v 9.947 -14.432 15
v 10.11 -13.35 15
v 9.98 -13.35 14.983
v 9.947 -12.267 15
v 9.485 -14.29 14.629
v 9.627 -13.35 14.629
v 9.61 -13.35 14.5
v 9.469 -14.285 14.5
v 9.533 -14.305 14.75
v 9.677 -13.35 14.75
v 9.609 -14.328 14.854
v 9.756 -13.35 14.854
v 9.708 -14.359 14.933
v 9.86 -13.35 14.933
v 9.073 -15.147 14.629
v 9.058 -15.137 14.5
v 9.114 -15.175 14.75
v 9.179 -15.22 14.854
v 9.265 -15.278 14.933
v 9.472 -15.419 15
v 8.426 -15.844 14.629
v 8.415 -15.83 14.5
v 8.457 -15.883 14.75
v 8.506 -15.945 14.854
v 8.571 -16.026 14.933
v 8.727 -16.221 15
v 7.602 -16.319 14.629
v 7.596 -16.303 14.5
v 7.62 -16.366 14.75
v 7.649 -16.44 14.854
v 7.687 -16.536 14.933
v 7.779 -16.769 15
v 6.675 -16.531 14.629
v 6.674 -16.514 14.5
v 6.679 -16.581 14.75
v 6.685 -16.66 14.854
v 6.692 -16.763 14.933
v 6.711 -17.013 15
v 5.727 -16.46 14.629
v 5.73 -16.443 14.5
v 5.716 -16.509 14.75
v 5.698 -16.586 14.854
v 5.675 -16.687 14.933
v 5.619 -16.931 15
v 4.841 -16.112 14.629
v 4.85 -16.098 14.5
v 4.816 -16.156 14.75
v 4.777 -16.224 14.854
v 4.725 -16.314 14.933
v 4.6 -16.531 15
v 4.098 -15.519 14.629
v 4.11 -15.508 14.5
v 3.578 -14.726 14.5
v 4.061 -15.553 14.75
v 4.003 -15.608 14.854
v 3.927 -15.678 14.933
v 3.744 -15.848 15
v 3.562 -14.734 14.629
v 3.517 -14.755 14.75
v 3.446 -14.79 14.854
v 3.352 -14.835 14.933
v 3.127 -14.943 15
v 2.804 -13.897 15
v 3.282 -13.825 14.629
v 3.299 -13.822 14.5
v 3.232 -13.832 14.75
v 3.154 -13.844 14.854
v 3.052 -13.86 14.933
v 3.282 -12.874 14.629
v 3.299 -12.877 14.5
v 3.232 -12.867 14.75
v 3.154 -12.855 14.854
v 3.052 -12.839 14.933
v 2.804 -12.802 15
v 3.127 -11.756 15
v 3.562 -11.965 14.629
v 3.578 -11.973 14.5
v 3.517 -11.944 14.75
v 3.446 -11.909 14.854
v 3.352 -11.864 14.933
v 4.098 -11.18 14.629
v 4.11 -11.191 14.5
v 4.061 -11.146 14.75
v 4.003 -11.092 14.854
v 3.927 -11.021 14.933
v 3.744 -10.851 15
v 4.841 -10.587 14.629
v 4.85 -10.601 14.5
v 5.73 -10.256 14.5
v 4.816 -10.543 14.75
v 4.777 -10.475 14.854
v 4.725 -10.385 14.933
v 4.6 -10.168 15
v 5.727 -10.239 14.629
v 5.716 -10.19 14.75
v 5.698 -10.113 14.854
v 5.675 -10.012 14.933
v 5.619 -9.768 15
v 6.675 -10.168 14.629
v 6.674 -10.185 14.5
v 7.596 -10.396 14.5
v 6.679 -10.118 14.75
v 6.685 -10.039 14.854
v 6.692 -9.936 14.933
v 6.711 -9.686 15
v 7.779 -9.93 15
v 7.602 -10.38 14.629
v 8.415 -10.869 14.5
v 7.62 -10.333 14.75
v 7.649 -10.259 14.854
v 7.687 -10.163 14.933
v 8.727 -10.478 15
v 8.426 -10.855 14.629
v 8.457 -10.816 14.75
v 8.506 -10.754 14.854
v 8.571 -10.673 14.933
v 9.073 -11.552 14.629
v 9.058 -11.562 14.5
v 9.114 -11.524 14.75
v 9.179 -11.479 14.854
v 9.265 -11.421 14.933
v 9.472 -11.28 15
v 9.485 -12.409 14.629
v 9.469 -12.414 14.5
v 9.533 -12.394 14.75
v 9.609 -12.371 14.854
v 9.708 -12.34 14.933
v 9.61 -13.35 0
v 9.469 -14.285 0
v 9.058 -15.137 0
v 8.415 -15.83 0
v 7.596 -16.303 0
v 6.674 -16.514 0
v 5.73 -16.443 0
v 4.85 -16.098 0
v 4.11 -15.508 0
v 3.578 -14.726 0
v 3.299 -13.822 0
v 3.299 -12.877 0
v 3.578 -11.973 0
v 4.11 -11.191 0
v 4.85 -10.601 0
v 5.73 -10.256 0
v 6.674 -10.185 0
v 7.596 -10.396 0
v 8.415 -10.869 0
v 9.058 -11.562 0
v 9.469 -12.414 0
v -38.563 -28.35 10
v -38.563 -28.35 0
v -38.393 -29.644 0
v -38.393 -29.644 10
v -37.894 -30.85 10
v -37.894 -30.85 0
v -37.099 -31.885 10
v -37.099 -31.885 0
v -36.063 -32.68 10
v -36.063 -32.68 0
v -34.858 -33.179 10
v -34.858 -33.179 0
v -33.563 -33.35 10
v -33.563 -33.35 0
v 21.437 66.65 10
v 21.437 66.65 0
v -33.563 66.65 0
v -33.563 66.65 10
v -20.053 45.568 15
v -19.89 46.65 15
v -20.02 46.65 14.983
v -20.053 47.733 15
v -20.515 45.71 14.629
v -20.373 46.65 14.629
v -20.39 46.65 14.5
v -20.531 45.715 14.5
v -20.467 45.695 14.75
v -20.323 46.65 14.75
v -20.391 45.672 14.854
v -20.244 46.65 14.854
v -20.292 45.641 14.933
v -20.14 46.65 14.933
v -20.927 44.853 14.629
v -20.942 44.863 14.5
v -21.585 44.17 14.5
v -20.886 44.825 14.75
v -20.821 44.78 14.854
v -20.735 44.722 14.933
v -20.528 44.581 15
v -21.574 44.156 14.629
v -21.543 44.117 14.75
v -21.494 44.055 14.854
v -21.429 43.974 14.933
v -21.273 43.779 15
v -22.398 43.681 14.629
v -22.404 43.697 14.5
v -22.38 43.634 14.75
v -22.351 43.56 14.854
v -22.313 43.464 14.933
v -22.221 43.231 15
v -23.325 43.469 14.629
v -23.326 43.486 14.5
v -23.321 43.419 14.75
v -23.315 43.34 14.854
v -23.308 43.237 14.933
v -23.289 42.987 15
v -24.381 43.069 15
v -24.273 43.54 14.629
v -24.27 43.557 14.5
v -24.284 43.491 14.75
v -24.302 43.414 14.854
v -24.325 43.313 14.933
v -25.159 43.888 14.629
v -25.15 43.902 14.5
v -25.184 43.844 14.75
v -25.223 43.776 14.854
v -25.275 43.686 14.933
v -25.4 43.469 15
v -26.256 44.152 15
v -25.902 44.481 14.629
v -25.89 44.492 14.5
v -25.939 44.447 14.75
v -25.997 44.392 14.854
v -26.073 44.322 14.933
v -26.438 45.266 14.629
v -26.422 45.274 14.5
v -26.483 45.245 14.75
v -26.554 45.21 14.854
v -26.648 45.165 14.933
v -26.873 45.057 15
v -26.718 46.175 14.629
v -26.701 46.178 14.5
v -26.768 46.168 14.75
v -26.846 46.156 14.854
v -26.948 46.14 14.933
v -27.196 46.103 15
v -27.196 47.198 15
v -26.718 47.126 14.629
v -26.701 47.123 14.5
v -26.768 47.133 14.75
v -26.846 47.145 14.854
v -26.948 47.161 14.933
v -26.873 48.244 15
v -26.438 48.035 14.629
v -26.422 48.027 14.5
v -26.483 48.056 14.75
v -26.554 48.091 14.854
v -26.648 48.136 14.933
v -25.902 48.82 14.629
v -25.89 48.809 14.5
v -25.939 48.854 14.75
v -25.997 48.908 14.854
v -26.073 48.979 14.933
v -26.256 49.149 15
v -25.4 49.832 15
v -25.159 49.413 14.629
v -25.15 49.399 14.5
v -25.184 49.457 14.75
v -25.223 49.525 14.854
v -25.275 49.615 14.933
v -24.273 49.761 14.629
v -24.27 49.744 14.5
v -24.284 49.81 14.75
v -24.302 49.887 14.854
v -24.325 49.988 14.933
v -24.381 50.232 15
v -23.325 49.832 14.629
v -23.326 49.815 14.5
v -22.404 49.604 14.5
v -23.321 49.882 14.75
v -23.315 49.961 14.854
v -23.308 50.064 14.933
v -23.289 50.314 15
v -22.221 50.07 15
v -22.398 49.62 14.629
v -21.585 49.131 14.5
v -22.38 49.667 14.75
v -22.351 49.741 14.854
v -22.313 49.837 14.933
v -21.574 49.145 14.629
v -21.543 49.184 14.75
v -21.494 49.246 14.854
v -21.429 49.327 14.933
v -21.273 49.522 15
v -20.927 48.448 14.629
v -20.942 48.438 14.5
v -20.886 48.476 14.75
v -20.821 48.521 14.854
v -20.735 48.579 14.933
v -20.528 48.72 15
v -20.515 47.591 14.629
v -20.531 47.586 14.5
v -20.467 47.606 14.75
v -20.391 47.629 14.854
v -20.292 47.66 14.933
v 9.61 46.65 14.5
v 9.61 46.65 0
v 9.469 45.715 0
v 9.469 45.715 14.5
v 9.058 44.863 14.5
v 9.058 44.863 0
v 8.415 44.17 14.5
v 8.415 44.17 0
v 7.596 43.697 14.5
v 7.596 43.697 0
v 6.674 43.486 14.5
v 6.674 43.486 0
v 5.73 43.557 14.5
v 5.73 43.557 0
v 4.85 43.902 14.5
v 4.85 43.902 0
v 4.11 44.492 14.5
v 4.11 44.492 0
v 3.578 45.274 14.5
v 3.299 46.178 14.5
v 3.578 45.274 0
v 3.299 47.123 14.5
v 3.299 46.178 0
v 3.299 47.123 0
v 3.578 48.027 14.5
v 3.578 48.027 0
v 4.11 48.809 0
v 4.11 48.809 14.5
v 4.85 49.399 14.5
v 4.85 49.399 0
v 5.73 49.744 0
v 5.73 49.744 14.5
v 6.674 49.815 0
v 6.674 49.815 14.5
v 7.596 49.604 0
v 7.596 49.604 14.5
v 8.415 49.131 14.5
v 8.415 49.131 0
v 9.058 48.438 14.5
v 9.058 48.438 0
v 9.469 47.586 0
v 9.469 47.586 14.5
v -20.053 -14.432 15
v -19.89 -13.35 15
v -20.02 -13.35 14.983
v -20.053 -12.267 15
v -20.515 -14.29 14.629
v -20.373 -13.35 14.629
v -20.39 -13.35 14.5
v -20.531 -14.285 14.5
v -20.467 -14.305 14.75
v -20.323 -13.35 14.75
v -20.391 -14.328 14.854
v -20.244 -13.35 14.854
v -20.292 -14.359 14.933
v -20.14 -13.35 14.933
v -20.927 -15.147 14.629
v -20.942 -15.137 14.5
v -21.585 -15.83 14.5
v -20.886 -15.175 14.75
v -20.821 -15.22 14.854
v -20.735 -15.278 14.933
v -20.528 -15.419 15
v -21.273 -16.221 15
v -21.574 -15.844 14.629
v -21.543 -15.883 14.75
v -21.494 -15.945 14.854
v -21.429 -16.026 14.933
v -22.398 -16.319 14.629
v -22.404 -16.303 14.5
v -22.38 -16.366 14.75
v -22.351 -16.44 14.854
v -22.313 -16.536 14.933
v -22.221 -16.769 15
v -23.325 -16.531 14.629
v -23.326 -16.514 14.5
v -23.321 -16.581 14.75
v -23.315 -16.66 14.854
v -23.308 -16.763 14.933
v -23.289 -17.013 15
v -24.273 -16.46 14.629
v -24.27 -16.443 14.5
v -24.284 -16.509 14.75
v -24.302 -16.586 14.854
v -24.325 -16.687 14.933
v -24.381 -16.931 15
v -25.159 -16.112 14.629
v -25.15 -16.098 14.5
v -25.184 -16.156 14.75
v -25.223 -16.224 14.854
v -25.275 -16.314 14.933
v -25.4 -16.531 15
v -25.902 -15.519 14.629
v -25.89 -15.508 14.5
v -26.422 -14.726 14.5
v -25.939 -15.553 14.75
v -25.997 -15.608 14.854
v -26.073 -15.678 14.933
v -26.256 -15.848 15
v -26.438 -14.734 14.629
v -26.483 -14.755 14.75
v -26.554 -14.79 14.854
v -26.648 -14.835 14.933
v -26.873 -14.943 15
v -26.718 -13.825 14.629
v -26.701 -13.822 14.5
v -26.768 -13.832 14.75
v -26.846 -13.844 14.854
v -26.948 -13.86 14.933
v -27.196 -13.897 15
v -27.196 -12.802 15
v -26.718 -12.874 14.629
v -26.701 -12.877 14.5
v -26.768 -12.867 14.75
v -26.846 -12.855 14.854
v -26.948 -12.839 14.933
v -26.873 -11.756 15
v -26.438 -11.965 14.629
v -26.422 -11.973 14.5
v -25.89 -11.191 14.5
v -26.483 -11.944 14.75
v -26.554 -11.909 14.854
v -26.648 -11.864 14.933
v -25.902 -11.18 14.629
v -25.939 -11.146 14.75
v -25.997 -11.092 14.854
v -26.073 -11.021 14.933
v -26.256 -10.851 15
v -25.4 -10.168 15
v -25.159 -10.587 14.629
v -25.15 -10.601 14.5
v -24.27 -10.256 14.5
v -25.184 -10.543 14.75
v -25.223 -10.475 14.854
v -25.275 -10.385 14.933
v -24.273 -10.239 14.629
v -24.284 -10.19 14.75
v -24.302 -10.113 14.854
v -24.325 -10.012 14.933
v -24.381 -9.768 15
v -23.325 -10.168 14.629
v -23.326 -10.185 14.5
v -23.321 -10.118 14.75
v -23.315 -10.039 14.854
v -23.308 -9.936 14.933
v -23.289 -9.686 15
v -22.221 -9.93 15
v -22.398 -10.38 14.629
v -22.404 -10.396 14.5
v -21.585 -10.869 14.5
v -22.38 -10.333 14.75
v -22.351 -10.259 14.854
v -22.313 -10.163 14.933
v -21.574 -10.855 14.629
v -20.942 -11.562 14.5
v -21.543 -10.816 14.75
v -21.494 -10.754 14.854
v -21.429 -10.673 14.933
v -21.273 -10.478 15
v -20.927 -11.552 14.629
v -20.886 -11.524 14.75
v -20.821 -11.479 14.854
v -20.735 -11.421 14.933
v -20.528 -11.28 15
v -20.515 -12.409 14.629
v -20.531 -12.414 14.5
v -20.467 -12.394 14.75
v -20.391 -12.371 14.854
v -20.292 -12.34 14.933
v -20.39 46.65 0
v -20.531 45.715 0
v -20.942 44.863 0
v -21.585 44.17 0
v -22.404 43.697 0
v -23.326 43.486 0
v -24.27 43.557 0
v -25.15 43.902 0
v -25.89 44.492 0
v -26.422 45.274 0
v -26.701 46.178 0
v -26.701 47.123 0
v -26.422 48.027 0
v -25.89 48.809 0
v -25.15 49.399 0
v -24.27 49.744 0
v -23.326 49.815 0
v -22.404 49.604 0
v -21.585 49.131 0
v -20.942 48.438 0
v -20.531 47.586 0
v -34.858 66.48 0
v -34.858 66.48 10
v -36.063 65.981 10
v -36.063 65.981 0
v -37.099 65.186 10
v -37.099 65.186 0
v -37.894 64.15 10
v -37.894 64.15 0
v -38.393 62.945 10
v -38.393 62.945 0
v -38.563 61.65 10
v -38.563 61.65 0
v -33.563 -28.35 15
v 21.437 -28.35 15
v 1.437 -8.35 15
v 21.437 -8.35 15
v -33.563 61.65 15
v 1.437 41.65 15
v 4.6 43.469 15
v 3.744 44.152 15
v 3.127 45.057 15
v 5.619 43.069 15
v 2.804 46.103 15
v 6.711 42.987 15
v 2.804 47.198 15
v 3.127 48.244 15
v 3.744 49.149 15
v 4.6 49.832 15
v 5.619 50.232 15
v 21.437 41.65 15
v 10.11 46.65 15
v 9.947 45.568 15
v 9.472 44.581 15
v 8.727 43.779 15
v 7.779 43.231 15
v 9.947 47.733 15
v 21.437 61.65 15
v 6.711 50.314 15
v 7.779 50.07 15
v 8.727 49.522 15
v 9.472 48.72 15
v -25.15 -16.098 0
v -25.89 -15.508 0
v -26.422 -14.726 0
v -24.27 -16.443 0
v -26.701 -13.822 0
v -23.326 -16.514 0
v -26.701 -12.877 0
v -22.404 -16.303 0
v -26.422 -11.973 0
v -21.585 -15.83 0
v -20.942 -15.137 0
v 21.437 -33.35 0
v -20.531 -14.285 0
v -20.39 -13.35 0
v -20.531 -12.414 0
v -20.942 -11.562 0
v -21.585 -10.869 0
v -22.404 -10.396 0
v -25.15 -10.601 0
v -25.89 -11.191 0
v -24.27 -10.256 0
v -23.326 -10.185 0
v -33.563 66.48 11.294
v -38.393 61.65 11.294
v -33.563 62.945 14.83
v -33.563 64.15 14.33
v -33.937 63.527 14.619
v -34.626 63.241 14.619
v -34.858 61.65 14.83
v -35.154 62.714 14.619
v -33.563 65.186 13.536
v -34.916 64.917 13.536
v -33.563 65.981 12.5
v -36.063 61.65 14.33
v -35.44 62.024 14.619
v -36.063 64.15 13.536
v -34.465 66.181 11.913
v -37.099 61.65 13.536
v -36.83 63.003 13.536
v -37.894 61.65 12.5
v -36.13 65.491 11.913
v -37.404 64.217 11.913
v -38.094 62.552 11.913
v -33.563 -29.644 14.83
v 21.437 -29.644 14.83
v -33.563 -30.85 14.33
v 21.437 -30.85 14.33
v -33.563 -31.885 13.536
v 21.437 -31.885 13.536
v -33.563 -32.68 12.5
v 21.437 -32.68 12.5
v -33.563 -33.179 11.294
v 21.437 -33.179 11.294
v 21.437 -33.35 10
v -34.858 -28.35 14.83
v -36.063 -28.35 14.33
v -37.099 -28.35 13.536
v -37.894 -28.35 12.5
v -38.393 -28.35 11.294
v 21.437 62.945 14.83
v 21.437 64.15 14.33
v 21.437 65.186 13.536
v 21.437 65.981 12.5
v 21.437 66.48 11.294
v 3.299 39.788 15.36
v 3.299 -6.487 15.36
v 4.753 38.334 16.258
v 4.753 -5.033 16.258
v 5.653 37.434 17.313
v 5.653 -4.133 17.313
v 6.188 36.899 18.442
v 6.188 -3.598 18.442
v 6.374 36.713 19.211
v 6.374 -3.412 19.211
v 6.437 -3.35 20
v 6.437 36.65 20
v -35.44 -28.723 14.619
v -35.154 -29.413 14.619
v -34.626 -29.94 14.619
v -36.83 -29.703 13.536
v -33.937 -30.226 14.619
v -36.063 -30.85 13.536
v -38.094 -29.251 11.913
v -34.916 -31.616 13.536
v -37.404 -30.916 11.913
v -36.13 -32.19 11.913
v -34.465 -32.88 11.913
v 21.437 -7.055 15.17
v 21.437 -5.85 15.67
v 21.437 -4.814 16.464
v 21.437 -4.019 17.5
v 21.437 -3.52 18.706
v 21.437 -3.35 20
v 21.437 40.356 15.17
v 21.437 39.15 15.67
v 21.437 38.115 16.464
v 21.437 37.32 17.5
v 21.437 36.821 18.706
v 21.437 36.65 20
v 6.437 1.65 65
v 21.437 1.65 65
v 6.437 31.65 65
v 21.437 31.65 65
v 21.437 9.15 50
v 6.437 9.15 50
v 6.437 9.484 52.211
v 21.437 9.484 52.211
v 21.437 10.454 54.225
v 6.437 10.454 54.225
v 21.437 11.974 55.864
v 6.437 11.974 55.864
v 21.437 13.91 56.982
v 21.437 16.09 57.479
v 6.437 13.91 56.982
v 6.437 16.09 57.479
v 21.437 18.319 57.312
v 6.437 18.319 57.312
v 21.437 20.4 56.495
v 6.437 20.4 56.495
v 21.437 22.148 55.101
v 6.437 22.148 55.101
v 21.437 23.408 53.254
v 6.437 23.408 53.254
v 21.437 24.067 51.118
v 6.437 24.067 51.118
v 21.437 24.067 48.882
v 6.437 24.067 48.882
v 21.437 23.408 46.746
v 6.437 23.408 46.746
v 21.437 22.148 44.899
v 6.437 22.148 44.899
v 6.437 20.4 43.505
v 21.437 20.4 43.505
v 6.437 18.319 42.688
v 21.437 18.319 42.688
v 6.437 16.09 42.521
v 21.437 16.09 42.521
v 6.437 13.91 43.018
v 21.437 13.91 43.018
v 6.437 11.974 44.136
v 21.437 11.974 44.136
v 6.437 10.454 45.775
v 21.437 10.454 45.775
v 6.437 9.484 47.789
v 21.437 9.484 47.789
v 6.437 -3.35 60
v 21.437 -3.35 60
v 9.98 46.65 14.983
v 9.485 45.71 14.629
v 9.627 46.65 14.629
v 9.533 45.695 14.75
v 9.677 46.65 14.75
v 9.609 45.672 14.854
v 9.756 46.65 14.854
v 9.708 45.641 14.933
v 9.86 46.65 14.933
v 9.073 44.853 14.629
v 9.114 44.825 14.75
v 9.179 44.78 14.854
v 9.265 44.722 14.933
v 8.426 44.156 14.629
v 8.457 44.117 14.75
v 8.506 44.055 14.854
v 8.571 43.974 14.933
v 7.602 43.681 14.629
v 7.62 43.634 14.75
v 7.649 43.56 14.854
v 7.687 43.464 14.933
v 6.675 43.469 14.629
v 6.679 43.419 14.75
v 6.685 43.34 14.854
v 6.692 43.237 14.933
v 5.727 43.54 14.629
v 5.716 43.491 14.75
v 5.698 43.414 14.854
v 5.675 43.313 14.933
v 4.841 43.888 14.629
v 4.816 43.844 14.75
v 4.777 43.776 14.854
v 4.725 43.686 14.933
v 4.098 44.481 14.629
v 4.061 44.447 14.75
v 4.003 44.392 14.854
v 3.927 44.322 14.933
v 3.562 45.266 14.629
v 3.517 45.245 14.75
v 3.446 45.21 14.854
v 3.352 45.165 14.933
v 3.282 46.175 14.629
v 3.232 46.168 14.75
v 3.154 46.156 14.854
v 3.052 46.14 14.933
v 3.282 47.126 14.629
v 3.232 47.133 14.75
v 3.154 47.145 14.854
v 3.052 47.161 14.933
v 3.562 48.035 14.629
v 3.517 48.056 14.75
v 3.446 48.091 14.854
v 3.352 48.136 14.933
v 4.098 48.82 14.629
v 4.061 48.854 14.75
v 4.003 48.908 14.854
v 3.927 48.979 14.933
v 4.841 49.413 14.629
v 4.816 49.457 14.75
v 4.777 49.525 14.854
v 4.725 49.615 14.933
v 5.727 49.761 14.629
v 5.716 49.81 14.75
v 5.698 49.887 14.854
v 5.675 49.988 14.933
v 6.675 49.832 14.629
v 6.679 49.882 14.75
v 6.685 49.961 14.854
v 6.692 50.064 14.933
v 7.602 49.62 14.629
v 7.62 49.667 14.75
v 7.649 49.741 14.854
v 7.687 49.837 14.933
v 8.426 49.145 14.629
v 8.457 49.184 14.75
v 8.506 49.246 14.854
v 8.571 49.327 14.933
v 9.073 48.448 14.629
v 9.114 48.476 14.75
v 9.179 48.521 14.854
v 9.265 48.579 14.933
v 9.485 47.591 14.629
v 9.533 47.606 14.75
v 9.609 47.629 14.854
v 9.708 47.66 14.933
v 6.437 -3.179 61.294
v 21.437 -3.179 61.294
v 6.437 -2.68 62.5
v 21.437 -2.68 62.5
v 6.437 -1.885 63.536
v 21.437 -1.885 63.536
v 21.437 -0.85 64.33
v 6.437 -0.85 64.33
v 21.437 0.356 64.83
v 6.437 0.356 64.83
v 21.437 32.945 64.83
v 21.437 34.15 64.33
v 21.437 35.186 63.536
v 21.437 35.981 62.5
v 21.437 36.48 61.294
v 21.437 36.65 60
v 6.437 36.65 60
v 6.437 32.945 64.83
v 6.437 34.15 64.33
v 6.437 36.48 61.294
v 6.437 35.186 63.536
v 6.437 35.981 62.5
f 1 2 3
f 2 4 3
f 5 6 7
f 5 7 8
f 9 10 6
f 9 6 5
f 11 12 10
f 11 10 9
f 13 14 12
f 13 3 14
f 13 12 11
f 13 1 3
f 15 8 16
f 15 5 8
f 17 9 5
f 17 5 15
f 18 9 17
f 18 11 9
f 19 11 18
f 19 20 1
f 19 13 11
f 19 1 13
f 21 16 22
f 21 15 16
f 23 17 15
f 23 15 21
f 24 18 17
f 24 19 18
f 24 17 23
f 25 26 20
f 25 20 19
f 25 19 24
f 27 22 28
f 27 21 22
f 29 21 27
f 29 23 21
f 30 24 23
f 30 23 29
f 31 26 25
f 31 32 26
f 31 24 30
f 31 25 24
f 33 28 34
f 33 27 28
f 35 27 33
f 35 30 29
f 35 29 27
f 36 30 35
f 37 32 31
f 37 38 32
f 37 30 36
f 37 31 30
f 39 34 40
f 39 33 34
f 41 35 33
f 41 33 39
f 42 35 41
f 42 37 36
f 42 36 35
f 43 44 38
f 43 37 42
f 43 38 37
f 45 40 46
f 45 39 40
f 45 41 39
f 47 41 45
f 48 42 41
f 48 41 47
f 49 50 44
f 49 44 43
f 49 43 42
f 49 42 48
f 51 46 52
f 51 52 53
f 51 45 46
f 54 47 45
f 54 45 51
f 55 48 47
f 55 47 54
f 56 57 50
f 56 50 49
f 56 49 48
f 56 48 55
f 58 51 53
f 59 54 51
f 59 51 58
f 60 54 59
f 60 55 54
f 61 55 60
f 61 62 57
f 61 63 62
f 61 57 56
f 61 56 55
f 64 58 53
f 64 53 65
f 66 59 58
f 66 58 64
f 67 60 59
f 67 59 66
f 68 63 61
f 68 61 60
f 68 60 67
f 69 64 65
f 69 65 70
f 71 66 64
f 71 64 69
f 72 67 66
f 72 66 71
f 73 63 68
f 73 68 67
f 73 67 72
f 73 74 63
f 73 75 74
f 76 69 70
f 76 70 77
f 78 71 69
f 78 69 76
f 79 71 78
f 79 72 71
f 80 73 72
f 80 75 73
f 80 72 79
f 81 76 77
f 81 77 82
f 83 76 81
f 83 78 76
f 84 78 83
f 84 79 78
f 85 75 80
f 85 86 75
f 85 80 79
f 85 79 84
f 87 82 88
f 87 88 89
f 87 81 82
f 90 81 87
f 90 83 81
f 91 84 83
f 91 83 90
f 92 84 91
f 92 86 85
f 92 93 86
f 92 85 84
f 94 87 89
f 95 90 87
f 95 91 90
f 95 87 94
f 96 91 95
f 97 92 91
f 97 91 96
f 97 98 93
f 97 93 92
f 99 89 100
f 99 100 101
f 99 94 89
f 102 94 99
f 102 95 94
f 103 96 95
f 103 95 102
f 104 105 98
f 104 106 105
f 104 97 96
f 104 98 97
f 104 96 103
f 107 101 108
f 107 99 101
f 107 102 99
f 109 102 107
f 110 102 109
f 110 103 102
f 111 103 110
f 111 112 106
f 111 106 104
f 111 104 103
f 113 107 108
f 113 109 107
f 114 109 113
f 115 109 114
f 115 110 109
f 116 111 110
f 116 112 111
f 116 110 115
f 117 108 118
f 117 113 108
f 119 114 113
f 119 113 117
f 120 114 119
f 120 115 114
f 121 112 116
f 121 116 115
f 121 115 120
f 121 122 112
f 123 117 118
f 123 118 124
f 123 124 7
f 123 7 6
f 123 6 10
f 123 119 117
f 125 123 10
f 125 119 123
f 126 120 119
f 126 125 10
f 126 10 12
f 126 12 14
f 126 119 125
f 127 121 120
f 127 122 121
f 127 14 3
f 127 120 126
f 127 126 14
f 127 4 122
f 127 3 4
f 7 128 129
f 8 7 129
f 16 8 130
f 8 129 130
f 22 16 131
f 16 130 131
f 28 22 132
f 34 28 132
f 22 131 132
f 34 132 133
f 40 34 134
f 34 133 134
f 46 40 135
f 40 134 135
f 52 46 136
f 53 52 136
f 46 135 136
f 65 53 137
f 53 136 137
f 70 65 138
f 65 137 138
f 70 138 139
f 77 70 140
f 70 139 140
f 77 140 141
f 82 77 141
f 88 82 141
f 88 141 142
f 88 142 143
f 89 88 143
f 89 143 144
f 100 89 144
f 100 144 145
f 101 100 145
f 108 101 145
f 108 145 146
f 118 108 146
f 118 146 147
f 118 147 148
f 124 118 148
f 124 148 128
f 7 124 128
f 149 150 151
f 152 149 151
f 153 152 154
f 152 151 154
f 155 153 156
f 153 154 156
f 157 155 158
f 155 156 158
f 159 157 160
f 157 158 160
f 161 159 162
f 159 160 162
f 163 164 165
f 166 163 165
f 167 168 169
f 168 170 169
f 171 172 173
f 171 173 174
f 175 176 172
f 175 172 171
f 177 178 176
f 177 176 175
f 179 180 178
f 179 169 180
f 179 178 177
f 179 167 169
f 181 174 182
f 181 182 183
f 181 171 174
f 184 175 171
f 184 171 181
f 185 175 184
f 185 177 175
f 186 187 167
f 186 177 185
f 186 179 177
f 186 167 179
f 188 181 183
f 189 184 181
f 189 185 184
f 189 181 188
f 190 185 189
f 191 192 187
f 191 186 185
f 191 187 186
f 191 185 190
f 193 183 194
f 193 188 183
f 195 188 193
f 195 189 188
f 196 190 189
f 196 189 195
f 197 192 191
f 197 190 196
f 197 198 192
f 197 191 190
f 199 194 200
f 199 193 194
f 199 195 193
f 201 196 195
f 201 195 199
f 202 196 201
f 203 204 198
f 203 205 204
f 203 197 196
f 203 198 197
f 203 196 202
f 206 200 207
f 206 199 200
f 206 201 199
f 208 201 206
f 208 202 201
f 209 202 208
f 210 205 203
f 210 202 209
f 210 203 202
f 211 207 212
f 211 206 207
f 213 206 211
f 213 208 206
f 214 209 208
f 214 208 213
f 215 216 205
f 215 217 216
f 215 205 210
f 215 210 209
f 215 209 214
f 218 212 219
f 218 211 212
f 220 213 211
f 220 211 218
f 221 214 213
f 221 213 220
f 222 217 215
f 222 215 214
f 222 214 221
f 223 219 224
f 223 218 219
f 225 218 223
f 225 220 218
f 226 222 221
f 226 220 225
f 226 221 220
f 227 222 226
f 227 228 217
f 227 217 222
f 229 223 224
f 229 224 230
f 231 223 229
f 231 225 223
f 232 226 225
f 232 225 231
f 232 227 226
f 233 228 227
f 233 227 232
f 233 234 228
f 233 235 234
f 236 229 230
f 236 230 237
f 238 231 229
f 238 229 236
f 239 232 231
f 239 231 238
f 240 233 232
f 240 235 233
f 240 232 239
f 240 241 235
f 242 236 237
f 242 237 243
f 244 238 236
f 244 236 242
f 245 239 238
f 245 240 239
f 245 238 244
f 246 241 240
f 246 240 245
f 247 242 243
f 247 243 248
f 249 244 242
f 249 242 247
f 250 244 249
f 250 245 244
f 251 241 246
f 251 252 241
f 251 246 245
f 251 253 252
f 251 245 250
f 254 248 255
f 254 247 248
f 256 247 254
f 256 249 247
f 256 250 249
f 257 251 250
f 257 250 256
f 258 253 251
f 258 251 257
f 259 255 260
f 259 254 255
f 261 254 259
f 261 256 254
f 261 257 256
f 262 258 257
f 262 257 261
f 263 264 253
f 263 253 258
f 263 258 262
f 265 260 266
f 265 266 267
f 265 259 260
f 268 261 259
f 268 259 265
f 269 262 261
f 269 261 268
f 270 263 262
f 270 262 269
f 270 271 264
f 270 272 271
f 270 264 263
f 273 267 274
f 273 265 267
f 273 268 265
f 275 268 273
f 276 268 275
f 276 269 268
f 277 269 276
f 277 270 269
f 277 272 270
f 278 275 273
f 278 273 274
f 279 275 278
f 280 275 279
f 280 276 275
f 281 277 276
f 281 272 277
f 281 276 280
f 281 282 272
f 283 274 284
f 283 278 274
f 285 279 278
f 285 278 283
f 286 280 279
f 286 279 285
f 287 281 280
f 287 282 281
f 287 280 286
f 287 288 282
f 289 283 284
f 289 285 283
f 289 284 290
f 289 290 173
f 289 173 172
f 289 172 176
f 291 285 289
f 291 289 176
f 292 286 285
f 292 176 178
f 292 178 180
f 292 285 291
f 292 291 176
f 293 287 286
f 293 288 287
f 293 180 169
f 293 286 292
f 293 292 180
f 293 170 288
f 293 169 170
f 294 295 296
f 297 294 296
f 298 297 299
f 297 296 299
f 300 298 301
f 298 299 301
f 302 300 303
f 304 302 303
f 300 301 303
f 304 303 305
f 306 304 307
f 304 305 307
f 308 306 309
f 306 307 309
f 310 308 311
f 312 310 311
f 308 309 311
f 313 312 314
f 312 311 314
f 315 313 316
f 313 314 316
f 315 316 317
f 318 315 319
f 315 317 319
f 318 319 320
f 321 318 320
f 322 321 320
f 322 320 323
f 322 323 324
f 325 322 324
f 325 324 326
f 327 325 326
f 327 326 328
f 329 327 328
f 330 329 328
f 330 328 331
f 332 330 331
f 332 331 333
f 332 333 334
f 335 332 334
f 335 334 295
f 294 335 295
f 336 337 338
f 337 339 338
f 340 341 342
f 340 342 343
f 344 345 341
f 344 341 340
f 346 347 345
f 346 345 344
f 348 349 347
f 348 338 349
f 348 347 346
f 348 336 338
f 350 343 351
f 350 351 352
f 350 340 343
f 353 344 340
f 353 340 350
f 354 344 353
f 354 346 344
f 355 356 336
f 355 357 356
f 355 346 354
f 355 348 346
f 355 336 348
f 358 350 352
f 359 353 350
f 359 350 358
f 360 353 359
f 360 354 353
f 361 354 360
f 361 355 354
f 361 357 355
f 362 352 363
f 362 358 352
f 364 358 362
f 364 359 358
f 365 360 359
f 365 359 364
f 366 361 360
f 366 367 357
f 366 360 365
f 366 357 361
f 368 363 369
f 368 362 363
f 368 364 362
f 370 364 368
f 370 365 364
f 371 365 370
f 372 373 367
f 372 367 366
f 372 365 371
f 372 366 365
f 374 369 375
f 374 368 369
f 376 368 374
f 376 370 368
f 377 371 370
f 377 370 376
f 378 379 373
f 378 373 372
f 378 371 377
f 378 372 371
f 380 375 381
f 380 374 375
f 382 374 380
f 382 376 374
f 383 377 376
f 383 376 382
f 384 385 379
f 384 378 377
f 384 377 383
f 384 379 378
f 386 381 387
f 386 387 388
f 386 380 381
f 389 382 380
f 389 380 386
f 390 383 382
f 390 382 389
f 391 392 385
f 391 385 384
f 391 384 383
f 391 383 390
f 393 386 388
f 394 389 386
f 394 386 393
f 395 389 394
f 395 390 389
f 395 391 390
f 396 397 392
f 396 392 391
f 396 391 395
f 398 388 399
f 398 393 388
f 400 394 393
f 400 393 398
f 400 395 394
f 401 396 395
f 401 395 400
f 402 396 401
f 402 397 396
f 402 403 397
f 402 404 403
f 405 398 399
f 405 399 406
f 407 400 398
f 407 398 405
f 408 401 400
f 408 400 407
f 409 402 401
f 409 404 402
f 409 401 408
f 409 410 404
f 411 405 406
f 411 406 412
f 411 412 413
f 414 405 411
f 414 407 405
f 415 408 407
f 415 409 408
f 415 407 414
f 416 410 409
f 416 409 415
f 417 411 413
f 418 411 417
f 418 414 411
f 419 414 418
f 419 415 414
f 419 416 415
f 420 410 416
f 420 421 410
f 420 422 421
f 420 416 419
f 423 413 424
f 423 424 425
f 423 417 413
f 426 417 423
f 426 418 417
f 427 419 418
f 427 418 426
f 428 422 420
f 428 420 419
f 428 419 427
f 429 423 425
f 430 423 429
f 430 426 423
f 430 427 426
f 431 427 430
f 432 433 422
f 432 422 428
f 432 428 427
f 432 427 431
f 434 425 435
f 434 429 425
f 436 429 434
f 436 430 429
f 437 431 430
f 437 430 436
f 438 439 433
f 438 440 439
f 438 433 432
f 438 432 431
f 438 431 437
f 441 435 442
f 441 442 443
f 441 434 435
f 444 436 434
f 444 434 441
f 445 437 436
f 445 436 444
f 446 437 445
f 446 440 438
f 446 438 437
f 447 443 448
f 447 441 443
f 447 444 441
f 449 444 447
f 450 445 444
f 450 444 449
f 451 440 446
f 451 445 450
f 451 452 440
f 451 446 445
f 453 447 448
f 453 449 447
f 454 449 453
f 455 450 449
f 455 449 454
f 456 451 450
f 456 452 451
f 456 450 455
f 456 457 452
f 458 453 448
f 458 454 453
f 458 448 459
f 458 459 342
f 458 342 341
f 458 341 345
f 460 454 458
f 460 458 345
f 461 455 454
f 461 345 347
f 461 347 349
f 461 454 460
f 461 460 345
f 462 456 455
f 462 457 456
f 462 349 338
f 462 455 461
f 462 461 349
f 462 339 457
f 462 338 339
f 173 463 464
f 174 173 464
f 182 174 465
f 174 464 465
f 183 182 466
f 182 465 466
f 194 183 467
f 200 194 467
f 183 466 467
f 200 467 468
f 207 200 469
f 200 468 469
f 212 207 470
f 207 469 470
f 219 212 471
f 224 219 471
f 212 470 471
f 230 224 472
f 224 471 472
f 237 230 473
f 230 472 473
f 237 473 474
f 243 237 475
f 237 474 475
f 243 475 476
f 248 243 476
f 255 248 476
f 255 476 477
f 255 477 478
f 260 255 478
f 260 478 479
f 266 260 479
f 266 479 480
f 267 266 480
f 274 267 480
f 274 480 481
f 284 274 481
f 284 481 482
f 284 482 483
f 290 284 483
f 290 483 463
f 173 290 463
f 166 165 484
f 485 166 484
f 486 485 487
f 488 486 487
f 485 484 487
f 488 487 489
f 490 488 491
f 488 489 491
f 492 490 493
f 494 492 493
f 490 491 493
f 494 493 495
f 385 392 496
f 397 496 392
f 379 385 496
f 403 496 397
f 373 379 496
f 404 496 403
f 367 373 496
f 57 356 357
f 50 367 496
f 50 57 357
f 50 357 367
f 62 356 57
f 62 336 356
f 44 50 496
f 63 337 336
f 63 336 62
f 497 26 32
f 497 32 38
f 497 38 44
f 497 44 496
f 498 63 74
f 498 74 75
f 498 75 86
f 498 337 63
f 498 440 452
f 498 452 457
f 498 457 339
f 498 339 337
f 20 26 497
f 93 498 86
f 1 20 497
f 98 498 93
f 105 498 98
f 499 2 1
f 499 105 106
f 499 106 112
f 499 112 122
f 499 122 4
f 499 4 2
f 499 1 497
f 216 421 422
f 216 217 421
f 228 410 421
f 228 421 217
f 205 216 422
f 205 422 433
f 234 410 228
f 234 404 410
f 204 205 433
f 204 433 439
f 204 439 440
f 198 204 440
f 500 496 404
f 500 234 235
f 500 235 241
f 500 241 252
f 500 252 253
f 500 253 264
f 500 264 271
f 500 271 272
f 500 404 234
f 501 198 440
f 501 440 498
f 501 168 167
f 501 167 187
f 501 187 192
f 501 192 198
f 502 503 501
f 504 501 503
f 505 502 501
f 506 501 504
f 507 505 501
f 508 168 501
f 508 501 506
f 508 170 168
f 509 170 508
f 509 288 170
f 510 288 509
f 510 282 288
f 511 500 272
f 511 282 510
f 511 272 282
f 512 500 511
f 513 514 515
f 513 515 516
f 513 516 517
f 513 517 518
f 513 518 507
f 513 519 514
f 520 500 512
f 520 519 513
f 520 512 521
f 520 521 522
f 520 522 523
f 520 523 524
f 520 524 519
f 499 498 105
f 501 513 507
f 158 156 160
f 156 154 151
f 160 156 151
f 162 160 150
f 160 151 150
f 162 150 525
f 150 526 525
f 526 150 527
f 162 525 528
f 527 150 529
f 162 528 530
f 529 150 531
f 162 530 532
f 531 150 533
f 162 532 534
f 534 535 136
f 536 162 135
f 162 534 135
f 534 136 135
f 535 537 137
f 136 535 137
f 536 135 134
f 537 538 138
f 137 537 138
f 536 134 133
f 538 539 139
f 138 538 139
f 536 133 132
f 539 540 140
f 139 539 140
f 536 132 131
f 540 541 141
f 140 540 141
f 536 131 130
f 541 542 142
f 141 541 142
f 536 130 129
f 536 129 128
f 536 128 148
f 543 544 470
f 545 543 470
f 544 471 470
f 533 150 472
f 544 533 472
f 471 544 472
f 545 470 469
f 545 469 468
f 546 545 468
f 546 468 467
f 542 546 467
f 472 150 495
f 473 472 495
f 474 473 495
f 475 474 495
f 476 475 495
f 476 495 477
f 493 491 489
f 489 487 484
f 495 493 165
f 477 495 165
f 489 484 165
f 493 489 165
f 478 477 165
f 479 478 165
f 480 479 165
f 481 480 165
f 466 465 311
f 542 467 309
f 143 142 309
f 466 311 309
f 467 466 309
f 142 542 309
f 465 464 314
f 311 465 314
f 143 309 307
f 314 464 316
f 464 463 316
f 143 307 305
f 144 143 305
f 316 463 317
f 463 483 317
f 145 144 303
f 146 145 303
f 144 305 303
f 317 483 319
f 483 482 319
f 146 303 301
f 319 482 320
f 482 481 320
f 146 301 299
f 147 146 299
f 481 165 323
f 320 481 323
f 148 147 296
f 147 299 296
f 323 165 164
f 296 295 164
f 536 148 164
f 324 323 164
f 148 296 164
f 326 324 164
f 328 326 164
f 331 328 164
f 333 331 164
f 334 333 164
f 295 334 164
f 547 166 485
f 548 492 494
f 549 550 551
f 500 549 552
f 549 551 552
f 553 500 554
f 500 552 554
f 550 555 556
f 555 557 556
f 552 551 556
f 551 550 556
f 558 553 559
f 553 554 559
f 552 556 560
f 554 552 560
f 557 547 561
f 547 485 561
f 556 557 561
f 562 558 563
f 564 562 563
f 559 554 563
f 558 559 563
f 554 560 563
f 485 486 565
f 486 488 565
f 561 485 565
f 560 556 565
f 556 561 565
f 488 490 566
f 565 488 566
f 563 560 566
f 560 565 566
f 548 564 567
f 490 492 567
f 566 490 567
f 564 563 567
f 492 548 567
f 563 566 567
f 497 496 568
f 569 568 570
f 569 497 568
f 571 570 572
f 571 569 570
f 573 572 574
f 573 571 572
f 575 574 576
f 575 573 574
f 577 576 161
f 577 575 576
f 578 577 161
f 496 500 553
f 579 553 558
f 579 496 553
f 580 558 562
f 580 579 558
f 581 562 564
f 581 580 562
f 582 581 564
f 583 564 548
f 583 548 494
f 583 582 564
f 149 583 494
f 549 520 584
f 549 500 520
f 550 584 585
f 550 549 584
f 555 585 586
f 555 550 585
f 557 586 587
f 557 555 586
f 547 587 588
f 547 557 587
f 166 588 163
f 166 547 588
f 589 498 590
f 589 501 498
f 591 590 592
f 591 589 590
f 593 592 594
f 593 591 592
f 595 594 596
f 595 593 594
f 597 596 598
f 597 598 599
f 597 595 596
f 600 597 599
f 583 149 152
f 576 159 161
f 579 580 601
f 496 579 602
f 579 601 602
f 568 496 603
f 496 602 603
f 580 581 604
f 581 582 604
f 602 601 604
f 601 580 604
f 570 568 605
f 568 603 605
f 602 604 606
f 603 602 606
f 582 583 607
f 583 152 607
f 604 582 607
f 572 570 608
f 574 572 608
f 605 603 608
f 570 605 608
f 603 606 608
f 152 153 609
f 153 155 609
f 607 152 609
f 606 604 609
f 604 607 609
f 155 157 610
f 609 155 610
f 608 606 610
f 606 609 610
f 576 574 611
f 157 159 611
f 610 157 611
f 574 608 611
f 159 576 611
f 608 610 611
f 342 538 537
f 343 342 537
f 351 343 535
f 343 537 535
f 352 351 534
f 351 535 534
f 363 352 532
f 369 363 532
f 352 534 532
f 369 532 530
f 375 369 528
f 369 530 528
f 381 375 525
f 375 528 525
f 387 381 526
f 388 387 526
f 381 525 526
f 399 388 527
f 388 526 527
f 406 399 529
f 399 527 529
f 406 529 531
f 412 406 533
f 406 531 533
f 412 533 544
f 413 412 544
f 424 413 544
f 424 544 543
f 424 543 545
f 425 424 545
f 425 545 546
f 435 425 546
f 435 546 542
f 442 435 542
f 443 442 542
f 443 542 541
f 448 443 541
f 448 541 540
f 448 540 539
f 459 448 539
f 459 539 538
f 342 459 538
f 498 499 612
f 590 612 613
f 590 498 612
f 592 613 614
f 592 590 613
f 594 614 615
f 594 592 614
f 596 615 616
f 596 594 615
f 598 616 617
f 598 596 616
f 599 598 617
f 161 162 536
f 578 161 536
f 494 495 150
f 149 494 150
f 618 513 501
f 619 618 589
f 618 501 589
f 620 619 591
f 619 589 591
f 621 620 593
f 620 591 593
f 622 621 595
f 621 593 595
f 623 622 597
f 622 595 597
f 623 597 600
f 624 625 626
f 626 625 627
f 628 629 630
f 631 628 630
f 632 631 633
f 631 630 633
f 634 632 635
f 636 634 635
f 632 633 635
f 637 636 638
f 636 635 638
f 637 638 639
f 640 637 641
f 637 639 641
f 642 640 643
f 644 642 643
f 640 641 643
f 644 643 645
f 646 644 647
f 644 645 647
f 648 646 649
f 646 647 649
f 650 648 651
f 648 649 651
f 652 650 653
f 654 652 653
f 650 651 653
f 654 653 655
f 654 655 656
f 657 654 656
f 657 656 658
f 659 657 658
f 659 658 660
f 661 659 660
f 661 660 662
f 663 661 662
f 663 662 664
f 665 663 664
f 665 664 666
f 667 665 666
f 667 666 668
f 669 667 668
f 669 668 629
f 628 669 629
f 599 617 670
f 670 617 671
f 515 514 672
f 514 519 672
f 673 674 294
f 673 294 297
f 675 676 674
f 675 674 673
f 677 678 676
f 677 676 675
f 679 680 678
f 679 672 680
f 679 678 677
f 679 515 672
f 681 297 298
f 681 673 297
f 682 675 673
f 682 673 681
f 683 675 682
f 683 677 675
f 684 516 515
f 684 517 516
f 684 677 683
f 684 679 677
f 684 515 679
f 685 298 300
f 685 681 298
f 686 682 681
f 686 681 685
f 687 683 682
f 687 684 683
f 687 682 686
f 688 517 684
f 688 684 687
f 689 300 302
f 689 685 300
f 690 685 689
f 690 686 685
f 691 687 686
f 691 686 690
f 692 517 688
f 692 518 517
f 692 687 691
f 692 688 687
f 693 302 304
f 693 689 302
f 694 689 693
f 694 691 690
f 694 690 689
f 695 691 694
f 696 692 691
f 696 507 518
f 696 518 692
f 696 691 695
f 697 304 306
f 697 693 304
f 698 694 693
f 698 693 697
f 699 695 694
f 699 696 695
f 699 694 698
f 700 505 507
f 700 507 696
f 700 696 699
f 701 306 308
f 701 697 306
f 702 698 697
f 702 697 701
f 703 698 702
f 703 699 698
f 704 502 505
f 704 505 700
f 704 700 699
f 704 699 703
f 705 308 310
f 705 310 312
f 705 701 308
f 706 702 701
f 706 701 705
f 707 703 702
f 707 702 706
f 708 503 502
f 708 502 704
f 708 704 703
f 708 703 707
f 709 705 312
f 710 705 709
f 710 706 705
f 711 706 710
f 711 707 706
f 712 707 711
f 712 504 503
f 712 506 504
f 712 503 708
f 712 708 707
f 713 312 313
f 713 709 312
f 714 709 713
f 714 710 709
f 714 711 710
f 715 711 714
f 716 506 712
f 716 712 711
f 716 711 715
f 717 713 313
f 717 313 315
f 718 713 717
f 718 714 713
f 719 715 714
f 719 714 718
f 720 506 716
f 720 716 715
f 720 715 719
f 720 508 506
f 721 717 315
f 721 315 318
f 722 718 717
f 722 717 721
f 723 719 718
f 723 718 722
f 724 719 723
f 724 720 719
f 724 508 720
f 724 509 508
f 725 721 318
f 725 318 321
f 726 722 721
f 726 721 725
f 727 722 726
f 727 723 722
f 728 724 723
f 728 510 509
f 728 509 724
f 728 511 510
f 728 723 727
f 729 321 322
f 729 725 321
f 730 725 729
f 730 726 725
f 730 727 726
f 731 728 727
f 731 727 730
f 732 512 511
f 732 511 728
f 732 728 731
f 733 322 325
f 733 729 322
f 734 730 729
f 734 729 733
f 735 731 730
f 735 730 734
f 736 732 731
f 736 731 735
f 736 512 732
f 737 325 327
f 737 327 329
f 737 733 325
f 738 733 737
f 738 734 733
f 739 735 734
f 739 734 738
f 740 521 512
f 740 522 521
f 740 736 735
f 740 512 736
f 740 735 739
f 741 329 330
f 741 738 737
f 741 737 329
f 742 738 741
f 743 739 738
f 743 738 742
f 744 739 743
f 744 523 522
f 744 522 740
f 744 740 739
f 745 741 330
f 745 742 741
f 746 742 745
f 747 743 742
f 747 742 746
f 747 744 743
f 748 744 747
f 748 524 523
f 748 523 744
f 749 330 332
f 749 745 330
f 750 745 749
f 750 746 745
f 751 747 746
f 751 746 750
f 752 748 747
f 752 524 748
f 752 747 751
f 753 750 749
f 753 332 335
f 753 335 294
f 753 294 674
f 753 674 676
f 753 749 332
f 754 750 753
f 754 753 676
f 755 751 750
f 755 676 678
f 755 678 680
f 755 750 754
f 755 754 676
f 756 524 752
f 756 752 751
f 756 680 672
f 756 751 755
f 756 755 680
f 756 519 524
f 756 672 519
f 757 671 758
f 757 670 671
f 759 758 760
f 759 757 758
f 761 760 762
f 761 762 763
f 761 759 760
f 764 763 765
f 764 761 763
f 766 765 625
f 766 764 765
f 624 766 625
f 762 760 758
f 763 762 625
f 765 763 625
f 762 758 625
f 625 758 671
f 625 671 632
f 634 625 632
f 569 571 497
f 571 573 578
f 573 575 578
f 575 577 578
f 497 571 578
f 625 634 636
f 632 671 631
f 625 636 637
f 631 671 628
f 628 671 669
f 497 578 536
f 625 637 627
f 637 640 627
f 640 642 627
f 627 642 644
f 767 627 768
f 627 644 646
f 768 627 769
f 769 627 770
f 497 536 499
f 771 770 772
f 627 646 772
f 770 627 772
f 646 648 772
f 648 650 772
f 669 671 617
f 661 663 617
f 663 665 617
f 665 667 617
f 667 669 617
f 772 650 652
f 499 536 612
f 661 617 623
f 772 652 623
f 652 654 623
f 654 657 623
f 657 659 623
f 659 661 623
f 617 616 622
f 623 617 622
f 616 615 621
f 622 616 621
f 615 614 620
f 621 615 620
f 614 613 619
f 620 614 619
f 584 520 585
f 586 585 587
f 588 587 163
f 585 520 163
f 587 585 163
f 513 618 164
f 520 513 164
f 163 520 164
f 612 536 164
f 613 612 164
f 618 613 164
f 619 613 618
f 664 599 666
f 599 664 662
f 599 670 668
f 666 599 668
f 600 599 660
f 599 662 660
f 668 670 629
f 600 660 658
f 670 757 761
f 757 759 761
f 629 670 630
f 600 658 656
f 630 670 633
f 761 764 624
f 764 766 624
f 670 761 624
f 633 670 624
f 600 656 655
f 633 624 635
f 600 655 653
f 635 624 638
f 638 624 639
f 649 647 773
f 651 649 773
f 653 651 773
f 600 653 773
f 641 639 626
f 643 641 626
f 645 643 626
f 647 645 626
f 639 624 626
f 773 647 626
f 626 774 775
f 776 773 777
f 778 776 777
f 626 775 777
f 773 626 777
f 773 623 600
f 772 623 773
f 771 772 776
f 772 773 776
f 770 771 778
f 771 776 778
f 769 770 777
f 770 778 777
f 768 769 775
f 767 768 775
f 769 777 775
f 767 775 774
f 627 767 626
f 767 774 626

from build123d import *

# Parameters (mm, degrees)
F1_DEPTH = 15
F2_W     = 40
F2_H     = 50
F3_DEPTH = 15
F5_R     = 5
F6_R     = 7.5
F7_DEPTH = 25
F8_R     = 3.1732892369
F9_DEPTH = 25
F10_R    = 0.5


with BuildPart() as f1:
    # F0 (on Top) → F1 (new body)
    with BuildSketch(Plane.XY):
        with BuildLine():
            ThreePointArc((-38.5634199679, -28.3495128886), (-37.0989538738, -31.8850467945), (-33.5634199679, -33.3495128886))
            Line((-33.5634199679, -33.3495128886), (21.4365800321, -33.3495128886))
            Line((21.4365800321, -33.3495128886), (21.4365800321, 66.6504871114))
            Line((21.4365800321, 66.6504871114), (-33.5634199679, 66.6504871114))
            ThreePointArc((-33.5634199679, 66.6504871114), (-37.0989538738, 65.1860210174), (-38.5634199679, 61.6504871114))
            Line((-38.5634199679, 61.6504871114), (-38.5634199679, -28.3495128886))
        make_face()
    extrude(amount=F1_DEPTH)


with BuildPart() as f3:
    # F2 (on face) → F3 (new body)
    with BuildSketch(Plane.YZ.offset(21.4365800321)):
        with Locations((16.6504871114, 40)):
            Rectangle(F2_W, F2_H)
    extrude(amount=-F3_DEPTH)

    # F4: union F1
    add(f1.part)

    # F5
    f5_edges = [f3.edges().sort_by_distance(p)[0] for p in [
        (6.43658, 16.650487, 15),
        (13.93658, -3.349513, 15),
        (13.93658, -3.349513, 65),
        (13.93658, 36.650487, 65),
        (13.93658, 36.650487, 15),
        (-6.06342, 66.650487, 15),
    ]]
    fillet(f5_edges, radius=F5_R)

    # F6 (on face) → F7 (cut)
    with BuildSketch(Plane(origin=(6.4365800321, 0, 0), x_dir=(0, -1, 0), z_dir=(-1, 0, 0))):
        with Locations((-16.6504871114, 50)):
            Circle(F6_R)
    extrude(amount=-F7_DEPTH, mode=Mode.SUBTRACT)

    # F8 (on face) → F9 (cut)
    with BuildSketch(Plane(origin=(0, 0, 0), x_dir=(1, 0, 0), z_dir=(0, 0, -1))):
        with Locations((-23.5634199679, -46.6504871114)):
            Circle(F8_R)
        with Locations((6.4365800321, -46.6504871114)):
            Circle(F8_R)
        with Locations((6.4365800321, 13.3495128886)):
            Circle(F8_R)
        with Locations((-23.5634199679, 13.3495128886)):
            Circle(F8_R)
    extrude(amount=-F9_DEPTH, mode=Mode.SUBTRACT)

    # F10
    f10_edges = [f3.edges().sort_by_distance(p)[0] for p in [
        (3.263291, -13.349513, 15),
        (-26.736709, -13.349513, 15),
        (-26.736709, 46.650487, 15),
        (3.263291, 46.650487, 15),
    ]]
    fillet(f10_edges, radius=F10_R)


solid = f3.part
